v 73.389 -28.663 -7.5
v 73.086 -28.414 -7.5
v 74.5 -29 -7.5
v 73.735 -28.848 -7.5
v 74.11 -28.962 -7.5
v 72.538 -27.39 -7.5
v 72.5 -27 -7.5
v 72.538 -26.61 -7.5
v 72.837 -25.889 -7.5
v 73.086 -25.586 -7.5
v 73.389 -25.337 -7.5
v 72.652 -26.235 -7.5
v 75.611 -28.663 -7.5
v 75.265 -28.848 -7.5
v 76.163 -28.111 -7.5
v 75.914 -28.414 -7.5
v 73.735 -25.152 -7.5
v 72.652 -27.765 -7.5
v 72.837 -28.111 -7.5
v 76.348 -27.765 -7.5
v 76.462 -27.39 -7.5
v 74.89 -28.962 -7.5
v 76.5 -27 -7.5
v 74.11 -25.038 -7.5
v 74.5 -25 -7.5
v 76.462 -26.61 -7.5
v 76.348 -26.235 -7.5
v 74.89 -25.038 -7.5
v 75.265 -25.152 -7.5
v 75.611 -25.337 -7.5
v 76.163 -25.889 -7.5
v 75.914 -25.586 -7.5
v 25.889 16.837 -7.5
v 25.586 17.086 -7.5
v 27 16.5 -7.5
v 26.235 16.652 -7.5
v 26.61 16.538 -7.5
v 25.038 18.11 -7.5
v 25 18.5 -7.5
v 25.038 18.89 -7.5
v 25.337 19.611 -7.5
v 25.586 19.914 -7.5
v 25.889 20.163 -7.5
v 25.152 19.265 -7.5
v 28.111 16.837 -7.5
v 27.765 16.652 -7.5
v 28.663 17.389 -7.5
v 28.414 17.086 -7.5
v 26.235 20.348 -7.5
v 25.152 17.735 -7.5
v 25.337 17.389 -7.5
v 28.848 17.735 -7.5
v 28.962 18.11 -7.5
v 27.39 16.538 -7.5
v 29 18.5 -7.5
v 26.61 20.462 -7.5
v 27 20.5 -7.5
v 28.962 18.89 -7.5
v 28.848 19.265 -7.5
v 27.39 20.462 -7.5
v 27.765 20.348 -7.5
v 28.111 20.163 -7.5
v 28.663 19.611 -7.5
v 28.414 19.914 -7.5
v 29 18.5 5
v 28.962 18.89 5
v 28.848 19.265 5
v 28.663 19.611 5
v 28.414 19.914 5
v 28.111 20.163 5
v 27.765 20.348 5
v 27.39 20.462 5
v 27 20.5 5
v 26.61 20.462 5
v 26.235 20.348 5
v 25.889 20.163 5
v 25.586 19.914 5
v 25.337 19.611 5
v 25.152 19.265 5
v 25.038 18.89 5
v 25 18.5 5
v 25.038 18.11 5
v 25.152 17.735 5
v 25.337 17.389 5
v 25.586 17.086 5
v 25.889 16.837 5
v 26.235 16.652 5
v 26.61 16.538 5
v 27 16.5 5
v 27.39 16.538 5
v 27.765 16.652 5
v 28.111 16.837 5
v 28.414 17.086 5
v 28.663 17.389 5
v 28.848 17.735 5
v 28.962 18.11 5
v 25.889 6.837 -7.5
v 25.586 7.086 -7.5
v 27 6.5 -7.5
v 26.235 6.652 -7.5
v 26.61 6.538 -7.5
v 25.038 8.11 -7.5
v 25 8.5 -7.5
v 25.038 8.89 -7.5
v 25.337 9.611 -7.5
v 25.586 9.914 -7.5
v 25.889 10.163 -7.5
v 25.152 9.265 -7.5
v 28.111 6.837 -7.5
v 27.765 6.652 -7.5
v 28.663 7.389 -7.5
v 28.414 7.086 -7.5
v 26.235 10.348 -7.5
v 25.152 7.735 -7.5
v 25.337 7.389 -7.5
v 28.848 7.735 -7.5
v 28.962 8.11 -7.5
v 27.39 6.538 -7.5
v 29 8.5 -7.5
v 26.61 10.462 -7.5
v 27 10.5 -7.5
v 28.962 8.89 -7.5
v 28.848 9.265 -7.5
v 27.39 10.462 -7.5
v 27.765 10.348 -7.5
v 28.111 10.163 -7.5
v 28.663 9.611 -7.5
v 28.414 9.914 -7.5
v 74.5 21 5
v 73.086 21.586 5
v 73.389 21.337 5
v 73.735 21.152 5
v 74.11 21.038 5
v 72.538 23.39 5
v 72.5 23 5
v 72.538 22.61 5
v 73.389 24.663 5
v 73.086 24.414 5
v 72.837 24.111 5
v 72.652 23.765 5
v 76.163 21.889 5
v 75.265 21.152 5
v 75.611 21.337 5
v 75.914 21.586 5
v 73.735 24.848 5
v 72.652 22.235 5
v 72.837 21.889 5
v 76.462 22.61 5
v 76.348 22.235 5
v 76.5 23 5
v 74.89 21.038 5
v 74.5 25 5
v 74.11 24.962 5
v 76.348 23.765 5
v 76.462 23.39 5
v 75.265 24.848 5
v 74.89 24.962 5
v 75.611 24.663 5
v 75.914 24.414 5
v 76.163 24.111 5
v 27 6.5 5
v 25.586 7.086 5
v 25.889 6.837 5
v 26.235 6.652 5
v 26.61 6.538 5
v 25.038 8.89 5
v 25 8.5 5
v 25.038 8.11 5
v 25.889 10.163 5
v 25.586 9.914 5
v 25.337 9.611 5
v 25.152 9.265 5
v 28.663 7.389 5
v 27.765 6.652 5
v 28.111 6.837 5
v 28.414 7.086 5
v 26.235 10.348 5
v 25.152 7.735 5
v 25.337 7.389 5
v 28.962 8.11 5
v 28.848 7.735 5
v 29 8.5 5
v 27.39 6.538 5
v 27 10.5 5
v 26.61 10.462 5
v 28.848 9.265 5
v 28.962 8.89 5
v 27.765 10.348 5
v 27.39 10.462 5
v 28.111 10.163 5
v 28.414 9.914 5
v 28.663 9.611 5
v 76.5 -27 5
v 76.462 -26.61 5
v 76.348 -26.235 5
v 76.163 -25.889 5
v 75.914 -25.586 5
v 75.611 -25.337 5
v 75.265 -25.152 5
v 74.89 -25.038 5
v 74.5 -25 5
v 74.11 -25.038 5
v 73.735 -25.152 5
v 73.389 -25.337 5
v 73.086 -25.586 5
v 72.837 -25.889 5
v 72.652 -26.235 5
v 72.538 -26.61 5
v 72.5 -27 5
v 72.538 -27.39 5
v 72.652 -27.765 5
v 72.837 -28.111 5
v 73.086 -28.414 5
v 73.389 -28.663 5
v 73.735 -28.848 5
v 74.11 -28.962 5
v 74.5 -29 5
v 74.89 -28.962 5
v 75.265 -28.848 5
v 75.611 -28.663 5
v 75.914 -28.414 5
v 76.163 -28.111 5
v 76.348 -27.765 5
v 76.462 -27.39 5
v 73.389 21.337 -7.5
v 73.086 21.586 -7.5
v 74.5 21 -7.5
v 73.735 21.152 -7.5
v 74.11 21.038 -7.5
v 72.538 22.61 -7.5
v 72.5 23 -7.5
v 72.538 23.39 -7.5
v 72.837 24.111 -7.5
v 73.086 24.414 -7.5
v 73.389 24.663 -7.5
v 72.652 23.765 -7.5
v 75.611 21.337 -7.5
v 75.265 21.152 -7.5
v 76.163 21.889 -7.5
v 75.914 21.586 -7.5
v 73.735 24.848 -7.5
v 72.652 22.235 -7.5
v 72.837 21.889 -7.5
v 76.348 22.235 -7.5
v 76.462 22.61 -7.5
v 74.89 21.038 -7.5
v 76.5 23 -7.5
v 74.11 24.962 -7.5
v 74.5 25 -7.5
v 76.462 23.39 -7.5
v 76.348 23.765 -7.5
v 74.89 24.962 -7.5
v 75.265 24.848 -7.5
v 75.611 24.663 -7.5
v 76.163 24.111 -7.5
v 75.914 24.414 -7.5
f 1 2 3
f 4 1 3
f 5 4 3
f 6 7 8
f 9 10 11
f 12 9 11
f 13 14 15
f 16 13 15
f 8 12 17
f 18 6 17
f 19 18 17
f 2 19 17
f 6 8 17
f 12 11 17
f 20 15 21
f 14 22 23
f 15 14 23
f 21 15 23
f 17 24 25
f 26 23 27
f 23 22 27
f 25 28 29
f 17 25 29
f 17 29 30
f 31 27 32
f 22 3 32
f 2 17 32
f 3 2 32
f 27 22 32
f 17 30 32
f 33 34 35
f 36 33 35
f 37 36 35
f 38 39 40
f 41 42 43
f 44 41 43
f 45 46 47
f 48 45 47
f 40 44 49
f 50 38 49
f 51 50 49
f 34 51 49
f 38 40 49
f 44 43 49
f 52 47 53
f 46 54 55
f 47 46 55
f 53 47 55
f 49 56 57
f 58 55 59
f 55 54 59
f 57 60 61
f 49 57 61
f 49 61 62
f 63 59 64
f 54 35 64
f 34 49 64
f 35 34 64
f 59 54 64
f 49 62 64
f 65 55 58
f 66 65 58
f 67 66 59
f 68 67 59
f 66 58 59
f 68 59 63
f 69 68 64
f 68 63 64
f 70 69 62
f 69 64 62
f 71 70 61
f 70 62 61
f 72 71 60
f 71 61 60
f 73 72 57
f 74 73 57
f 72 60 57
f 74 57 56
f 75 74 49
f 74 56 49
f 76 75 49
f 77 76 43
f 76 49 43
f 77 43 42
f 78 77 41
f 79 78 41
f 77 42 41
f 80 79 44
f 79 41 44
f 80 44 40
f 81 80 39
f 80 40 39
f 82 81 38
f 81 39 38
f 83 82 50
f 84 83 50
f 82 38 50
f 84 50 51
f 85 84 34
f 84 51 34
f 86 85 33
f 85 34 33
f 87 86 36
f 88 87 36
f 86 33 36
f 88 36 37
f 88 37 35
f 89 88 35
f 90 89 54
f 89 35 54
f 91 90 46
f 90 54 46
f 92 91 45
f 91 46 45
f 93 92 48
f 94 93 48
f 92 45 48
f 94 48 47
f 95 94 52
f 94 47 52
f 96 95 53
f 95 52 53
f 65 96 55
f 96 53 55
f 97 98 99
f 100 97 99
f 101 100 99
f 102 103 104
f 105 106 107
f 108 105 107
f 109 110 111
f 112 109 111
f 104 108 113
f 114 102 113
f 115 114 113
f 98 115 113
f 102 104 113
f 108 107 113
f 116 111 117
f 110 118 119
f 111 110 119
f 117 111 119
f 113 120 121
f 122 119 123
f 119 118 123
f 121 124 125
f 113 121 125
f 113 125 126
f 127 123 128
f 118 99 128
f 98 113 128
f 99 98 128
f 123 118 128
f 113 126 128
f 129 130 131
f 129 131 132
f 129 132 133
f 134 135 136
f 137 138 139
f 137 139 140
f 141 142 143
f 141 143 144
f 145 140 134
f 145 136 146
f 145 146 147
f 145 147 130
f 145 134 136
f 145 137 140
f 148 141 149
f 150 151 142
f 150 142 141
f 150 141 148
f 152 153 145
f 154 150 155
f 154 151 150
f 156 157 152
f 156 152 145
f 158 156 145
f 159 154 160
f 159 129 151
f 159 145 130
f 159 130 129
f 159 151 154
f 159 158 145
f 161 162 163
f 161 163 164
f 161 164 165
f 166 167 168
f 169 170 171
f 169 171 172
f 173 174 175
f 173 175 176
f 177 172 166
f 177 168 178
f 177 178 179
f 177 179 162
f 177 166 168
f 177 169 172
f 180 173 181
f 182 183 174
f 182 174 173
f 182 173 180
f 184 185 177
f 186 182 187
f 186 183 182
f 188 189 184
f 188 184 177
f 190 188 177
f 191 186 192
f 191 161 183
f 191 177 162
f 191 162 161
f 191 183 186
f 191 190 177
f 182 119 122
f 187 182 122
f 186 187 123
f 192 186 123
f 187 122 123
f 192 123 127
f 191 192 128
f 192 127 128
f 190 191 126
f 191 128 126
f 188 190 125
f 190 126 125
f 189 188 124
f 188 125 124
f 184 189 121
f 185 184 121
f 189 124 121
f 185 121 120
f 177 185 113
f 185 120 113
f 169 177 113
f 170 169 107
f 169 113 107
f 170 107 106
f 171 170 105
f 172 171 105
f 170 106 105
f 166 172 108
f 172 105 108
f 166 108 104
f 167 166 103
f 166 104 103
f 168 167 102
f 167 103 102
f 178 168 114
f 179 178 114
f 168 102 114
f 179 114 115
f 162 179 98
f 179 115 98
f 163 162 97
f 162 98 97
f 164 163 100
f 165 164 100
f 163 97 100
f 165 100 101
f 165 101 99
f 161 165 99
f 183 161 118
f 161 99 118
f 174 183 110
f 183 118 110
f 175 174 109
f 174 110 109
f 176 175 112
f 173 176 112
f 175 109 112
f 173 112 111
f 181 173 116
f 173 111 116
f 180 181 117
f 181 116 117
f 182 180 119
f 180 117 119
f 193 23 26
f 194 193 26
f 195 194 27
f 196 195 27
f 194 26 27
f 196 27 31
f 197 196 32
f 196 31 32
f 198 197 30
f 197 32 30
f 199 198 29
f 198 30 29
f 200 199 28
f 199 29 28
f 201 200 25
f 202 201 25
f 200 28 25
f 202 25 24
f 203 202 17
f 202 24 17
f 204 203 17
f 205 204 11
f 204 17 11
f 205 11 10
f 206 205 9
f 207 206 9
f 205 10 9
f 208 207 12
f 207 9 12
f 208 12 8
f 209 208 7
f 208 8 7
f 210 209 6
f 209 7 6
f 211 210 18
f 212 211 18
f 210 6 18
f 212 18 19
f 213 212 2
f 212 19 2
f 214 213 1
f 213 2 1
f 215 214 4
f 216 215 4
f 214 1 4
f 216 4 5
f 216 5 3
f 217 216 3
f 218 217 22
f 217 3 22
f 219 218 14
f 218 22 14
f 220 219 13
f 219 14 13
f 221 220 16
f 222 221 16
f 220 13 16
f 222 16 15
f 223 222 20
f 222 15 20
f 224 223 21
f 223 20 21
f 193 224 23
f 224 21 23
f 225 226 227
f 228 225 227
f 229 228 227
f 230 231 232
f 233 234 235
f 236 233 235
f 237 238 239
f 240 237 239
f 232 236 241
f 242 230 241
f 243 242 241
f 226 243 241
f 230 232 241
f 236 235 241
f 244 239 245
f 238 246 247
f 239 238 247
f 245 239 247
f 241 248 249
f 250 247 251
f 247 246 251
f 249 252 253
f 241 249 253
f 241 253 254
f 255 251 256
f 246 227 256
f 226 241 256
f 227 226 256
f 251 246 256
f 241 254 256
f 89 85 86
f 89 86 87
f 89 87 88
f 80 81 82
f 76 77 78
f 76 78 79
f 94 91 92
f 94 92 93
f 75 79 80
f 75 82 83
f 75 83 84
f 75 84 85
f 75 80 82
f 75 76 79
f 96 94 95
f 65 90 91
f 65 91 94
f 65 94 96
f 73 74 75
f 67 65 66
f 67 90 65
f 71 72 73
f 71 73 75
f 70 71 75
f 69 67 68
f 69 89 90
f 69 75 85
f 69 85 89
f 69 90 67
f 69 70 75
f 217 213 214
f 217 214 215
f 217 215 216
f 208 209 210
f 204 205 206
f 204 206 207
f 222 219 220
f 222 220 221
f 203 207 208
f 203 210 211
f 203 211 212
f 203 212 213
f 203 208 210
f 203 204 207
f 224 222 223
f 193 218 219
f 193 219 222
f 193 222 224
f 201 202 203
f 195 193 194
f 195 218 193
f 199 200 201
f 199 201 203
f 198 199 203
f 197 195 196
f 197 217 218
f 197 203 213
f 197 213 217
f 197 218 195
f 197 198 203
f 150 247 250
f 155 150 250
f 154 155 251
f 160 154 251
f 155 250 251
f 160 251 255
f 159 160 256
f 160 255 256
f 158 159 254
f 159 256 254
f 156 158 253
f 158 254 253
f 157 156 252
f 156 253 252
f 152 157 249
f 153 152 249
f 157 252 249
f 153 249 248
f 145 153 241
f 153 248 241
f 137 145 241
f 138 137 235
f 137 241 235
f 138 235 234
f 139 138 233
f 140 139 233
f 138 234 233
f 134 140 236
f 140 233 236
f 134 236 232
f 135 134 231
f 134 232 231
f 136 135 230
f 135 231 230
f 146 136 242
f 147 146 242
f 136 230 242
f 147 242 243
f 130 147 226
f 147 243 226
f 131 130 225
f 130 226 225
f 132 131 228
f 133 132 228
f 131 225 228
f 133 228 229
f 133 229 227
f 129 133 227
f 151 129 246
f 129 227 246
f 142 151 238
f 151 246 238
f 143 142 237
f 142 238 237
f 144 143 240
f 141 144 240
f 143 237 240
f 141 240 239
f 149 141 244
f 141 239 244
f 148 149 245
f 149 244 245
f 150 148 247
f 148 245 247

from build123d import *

# Parameters (mm, degrees)
BOSS_EXTRUDE1_DEPTH        = 5
BOSS_EXTRUDE1_DEPTH_BACK   = 7.5
SKETCH1_R                  = 2
BOSS_EXTRUDE1_2_DEPTH      = 5
BOSS_EXTRUDE1_2_DEPTH_BACK = 7.5
BOSS_EXTRUDE1_3_DEPTH      = 5
BOSS_EXTRUDE1_3_DEPTH_BACK = 7.5
BOSS_EXTRUDE1_4_DEPTH      = 5
BOSS_EXTRUDE1_4_DEPTH_BACK = 7.5


with BuildPart() as part:
    # Sketch1 → Boss-Extrude1 (new, two sides: drawn at the far end of the back side and taken through both)
    with BuildSketch(Plane.XY.offset(-BOSS_EXTRUDE1_DEPTH_BACK)):
        with Locations((27, 8.5)):
            Circle(SKETCH1_R)
    extrude(amount=BOSS_EXTRUDE1_DEPTH + BOSS_EXTRUDE1_DEPTH_BACK)


with BuildPart() as body_2:
    # Sketch1 → Boss-Extrude1 2 (new, two sides: drawn at the far end of the back side and taken through both)
    with BuildSketch(Plane.XY.offset(-BOSS_EXTRUDE1_2_DEPTH_BACK)):
        with Locations((27, 18.5)):
            Circle(SKETCH1_R)
    extrude(amount=BOSS_EXTRUDE1_2_DEPTH + BOSS_EXTRUDE1_2_DEPTH_BACK)


with BuildPart() as body_3:
    # Sketch1 → Boss-Extrude1 3 (new, two sides: drawn at the far end of the back side and taken through both)
    with BuildSketch(Plane.XY.offset(-BOSS_EXTRUDE1_3_DEPTH_BACK)):
        with Locations((74.5, 23)):
            Circle(SKETCH1_R)
    extrude(amount=BOSS_EXTRUDE1_3_DEPTH + BOSS_EXTRUDE1_3_DEPTH_BACK)


with BuildPart() as body_4:
    # Sketch1 → Boss-Extrude1 4 (new, two sides: drawn at the far end of the back side and taken through both)
    with BuildSketch(Plane.XY.offset(-BOSS_EXTRUDE1_4_DEPTH_BACK)):
        with Locations((74.5, -27)):
            Circle(SKETCH1_R)
    extrude(amount=BOSS_EXTRUDE1_4_DEPTH + BOSS_EXTRUDE1_4_DEPTH_BACK)


solid = Compound([part.part, body_2.part, body_3.part, body_4.part])
